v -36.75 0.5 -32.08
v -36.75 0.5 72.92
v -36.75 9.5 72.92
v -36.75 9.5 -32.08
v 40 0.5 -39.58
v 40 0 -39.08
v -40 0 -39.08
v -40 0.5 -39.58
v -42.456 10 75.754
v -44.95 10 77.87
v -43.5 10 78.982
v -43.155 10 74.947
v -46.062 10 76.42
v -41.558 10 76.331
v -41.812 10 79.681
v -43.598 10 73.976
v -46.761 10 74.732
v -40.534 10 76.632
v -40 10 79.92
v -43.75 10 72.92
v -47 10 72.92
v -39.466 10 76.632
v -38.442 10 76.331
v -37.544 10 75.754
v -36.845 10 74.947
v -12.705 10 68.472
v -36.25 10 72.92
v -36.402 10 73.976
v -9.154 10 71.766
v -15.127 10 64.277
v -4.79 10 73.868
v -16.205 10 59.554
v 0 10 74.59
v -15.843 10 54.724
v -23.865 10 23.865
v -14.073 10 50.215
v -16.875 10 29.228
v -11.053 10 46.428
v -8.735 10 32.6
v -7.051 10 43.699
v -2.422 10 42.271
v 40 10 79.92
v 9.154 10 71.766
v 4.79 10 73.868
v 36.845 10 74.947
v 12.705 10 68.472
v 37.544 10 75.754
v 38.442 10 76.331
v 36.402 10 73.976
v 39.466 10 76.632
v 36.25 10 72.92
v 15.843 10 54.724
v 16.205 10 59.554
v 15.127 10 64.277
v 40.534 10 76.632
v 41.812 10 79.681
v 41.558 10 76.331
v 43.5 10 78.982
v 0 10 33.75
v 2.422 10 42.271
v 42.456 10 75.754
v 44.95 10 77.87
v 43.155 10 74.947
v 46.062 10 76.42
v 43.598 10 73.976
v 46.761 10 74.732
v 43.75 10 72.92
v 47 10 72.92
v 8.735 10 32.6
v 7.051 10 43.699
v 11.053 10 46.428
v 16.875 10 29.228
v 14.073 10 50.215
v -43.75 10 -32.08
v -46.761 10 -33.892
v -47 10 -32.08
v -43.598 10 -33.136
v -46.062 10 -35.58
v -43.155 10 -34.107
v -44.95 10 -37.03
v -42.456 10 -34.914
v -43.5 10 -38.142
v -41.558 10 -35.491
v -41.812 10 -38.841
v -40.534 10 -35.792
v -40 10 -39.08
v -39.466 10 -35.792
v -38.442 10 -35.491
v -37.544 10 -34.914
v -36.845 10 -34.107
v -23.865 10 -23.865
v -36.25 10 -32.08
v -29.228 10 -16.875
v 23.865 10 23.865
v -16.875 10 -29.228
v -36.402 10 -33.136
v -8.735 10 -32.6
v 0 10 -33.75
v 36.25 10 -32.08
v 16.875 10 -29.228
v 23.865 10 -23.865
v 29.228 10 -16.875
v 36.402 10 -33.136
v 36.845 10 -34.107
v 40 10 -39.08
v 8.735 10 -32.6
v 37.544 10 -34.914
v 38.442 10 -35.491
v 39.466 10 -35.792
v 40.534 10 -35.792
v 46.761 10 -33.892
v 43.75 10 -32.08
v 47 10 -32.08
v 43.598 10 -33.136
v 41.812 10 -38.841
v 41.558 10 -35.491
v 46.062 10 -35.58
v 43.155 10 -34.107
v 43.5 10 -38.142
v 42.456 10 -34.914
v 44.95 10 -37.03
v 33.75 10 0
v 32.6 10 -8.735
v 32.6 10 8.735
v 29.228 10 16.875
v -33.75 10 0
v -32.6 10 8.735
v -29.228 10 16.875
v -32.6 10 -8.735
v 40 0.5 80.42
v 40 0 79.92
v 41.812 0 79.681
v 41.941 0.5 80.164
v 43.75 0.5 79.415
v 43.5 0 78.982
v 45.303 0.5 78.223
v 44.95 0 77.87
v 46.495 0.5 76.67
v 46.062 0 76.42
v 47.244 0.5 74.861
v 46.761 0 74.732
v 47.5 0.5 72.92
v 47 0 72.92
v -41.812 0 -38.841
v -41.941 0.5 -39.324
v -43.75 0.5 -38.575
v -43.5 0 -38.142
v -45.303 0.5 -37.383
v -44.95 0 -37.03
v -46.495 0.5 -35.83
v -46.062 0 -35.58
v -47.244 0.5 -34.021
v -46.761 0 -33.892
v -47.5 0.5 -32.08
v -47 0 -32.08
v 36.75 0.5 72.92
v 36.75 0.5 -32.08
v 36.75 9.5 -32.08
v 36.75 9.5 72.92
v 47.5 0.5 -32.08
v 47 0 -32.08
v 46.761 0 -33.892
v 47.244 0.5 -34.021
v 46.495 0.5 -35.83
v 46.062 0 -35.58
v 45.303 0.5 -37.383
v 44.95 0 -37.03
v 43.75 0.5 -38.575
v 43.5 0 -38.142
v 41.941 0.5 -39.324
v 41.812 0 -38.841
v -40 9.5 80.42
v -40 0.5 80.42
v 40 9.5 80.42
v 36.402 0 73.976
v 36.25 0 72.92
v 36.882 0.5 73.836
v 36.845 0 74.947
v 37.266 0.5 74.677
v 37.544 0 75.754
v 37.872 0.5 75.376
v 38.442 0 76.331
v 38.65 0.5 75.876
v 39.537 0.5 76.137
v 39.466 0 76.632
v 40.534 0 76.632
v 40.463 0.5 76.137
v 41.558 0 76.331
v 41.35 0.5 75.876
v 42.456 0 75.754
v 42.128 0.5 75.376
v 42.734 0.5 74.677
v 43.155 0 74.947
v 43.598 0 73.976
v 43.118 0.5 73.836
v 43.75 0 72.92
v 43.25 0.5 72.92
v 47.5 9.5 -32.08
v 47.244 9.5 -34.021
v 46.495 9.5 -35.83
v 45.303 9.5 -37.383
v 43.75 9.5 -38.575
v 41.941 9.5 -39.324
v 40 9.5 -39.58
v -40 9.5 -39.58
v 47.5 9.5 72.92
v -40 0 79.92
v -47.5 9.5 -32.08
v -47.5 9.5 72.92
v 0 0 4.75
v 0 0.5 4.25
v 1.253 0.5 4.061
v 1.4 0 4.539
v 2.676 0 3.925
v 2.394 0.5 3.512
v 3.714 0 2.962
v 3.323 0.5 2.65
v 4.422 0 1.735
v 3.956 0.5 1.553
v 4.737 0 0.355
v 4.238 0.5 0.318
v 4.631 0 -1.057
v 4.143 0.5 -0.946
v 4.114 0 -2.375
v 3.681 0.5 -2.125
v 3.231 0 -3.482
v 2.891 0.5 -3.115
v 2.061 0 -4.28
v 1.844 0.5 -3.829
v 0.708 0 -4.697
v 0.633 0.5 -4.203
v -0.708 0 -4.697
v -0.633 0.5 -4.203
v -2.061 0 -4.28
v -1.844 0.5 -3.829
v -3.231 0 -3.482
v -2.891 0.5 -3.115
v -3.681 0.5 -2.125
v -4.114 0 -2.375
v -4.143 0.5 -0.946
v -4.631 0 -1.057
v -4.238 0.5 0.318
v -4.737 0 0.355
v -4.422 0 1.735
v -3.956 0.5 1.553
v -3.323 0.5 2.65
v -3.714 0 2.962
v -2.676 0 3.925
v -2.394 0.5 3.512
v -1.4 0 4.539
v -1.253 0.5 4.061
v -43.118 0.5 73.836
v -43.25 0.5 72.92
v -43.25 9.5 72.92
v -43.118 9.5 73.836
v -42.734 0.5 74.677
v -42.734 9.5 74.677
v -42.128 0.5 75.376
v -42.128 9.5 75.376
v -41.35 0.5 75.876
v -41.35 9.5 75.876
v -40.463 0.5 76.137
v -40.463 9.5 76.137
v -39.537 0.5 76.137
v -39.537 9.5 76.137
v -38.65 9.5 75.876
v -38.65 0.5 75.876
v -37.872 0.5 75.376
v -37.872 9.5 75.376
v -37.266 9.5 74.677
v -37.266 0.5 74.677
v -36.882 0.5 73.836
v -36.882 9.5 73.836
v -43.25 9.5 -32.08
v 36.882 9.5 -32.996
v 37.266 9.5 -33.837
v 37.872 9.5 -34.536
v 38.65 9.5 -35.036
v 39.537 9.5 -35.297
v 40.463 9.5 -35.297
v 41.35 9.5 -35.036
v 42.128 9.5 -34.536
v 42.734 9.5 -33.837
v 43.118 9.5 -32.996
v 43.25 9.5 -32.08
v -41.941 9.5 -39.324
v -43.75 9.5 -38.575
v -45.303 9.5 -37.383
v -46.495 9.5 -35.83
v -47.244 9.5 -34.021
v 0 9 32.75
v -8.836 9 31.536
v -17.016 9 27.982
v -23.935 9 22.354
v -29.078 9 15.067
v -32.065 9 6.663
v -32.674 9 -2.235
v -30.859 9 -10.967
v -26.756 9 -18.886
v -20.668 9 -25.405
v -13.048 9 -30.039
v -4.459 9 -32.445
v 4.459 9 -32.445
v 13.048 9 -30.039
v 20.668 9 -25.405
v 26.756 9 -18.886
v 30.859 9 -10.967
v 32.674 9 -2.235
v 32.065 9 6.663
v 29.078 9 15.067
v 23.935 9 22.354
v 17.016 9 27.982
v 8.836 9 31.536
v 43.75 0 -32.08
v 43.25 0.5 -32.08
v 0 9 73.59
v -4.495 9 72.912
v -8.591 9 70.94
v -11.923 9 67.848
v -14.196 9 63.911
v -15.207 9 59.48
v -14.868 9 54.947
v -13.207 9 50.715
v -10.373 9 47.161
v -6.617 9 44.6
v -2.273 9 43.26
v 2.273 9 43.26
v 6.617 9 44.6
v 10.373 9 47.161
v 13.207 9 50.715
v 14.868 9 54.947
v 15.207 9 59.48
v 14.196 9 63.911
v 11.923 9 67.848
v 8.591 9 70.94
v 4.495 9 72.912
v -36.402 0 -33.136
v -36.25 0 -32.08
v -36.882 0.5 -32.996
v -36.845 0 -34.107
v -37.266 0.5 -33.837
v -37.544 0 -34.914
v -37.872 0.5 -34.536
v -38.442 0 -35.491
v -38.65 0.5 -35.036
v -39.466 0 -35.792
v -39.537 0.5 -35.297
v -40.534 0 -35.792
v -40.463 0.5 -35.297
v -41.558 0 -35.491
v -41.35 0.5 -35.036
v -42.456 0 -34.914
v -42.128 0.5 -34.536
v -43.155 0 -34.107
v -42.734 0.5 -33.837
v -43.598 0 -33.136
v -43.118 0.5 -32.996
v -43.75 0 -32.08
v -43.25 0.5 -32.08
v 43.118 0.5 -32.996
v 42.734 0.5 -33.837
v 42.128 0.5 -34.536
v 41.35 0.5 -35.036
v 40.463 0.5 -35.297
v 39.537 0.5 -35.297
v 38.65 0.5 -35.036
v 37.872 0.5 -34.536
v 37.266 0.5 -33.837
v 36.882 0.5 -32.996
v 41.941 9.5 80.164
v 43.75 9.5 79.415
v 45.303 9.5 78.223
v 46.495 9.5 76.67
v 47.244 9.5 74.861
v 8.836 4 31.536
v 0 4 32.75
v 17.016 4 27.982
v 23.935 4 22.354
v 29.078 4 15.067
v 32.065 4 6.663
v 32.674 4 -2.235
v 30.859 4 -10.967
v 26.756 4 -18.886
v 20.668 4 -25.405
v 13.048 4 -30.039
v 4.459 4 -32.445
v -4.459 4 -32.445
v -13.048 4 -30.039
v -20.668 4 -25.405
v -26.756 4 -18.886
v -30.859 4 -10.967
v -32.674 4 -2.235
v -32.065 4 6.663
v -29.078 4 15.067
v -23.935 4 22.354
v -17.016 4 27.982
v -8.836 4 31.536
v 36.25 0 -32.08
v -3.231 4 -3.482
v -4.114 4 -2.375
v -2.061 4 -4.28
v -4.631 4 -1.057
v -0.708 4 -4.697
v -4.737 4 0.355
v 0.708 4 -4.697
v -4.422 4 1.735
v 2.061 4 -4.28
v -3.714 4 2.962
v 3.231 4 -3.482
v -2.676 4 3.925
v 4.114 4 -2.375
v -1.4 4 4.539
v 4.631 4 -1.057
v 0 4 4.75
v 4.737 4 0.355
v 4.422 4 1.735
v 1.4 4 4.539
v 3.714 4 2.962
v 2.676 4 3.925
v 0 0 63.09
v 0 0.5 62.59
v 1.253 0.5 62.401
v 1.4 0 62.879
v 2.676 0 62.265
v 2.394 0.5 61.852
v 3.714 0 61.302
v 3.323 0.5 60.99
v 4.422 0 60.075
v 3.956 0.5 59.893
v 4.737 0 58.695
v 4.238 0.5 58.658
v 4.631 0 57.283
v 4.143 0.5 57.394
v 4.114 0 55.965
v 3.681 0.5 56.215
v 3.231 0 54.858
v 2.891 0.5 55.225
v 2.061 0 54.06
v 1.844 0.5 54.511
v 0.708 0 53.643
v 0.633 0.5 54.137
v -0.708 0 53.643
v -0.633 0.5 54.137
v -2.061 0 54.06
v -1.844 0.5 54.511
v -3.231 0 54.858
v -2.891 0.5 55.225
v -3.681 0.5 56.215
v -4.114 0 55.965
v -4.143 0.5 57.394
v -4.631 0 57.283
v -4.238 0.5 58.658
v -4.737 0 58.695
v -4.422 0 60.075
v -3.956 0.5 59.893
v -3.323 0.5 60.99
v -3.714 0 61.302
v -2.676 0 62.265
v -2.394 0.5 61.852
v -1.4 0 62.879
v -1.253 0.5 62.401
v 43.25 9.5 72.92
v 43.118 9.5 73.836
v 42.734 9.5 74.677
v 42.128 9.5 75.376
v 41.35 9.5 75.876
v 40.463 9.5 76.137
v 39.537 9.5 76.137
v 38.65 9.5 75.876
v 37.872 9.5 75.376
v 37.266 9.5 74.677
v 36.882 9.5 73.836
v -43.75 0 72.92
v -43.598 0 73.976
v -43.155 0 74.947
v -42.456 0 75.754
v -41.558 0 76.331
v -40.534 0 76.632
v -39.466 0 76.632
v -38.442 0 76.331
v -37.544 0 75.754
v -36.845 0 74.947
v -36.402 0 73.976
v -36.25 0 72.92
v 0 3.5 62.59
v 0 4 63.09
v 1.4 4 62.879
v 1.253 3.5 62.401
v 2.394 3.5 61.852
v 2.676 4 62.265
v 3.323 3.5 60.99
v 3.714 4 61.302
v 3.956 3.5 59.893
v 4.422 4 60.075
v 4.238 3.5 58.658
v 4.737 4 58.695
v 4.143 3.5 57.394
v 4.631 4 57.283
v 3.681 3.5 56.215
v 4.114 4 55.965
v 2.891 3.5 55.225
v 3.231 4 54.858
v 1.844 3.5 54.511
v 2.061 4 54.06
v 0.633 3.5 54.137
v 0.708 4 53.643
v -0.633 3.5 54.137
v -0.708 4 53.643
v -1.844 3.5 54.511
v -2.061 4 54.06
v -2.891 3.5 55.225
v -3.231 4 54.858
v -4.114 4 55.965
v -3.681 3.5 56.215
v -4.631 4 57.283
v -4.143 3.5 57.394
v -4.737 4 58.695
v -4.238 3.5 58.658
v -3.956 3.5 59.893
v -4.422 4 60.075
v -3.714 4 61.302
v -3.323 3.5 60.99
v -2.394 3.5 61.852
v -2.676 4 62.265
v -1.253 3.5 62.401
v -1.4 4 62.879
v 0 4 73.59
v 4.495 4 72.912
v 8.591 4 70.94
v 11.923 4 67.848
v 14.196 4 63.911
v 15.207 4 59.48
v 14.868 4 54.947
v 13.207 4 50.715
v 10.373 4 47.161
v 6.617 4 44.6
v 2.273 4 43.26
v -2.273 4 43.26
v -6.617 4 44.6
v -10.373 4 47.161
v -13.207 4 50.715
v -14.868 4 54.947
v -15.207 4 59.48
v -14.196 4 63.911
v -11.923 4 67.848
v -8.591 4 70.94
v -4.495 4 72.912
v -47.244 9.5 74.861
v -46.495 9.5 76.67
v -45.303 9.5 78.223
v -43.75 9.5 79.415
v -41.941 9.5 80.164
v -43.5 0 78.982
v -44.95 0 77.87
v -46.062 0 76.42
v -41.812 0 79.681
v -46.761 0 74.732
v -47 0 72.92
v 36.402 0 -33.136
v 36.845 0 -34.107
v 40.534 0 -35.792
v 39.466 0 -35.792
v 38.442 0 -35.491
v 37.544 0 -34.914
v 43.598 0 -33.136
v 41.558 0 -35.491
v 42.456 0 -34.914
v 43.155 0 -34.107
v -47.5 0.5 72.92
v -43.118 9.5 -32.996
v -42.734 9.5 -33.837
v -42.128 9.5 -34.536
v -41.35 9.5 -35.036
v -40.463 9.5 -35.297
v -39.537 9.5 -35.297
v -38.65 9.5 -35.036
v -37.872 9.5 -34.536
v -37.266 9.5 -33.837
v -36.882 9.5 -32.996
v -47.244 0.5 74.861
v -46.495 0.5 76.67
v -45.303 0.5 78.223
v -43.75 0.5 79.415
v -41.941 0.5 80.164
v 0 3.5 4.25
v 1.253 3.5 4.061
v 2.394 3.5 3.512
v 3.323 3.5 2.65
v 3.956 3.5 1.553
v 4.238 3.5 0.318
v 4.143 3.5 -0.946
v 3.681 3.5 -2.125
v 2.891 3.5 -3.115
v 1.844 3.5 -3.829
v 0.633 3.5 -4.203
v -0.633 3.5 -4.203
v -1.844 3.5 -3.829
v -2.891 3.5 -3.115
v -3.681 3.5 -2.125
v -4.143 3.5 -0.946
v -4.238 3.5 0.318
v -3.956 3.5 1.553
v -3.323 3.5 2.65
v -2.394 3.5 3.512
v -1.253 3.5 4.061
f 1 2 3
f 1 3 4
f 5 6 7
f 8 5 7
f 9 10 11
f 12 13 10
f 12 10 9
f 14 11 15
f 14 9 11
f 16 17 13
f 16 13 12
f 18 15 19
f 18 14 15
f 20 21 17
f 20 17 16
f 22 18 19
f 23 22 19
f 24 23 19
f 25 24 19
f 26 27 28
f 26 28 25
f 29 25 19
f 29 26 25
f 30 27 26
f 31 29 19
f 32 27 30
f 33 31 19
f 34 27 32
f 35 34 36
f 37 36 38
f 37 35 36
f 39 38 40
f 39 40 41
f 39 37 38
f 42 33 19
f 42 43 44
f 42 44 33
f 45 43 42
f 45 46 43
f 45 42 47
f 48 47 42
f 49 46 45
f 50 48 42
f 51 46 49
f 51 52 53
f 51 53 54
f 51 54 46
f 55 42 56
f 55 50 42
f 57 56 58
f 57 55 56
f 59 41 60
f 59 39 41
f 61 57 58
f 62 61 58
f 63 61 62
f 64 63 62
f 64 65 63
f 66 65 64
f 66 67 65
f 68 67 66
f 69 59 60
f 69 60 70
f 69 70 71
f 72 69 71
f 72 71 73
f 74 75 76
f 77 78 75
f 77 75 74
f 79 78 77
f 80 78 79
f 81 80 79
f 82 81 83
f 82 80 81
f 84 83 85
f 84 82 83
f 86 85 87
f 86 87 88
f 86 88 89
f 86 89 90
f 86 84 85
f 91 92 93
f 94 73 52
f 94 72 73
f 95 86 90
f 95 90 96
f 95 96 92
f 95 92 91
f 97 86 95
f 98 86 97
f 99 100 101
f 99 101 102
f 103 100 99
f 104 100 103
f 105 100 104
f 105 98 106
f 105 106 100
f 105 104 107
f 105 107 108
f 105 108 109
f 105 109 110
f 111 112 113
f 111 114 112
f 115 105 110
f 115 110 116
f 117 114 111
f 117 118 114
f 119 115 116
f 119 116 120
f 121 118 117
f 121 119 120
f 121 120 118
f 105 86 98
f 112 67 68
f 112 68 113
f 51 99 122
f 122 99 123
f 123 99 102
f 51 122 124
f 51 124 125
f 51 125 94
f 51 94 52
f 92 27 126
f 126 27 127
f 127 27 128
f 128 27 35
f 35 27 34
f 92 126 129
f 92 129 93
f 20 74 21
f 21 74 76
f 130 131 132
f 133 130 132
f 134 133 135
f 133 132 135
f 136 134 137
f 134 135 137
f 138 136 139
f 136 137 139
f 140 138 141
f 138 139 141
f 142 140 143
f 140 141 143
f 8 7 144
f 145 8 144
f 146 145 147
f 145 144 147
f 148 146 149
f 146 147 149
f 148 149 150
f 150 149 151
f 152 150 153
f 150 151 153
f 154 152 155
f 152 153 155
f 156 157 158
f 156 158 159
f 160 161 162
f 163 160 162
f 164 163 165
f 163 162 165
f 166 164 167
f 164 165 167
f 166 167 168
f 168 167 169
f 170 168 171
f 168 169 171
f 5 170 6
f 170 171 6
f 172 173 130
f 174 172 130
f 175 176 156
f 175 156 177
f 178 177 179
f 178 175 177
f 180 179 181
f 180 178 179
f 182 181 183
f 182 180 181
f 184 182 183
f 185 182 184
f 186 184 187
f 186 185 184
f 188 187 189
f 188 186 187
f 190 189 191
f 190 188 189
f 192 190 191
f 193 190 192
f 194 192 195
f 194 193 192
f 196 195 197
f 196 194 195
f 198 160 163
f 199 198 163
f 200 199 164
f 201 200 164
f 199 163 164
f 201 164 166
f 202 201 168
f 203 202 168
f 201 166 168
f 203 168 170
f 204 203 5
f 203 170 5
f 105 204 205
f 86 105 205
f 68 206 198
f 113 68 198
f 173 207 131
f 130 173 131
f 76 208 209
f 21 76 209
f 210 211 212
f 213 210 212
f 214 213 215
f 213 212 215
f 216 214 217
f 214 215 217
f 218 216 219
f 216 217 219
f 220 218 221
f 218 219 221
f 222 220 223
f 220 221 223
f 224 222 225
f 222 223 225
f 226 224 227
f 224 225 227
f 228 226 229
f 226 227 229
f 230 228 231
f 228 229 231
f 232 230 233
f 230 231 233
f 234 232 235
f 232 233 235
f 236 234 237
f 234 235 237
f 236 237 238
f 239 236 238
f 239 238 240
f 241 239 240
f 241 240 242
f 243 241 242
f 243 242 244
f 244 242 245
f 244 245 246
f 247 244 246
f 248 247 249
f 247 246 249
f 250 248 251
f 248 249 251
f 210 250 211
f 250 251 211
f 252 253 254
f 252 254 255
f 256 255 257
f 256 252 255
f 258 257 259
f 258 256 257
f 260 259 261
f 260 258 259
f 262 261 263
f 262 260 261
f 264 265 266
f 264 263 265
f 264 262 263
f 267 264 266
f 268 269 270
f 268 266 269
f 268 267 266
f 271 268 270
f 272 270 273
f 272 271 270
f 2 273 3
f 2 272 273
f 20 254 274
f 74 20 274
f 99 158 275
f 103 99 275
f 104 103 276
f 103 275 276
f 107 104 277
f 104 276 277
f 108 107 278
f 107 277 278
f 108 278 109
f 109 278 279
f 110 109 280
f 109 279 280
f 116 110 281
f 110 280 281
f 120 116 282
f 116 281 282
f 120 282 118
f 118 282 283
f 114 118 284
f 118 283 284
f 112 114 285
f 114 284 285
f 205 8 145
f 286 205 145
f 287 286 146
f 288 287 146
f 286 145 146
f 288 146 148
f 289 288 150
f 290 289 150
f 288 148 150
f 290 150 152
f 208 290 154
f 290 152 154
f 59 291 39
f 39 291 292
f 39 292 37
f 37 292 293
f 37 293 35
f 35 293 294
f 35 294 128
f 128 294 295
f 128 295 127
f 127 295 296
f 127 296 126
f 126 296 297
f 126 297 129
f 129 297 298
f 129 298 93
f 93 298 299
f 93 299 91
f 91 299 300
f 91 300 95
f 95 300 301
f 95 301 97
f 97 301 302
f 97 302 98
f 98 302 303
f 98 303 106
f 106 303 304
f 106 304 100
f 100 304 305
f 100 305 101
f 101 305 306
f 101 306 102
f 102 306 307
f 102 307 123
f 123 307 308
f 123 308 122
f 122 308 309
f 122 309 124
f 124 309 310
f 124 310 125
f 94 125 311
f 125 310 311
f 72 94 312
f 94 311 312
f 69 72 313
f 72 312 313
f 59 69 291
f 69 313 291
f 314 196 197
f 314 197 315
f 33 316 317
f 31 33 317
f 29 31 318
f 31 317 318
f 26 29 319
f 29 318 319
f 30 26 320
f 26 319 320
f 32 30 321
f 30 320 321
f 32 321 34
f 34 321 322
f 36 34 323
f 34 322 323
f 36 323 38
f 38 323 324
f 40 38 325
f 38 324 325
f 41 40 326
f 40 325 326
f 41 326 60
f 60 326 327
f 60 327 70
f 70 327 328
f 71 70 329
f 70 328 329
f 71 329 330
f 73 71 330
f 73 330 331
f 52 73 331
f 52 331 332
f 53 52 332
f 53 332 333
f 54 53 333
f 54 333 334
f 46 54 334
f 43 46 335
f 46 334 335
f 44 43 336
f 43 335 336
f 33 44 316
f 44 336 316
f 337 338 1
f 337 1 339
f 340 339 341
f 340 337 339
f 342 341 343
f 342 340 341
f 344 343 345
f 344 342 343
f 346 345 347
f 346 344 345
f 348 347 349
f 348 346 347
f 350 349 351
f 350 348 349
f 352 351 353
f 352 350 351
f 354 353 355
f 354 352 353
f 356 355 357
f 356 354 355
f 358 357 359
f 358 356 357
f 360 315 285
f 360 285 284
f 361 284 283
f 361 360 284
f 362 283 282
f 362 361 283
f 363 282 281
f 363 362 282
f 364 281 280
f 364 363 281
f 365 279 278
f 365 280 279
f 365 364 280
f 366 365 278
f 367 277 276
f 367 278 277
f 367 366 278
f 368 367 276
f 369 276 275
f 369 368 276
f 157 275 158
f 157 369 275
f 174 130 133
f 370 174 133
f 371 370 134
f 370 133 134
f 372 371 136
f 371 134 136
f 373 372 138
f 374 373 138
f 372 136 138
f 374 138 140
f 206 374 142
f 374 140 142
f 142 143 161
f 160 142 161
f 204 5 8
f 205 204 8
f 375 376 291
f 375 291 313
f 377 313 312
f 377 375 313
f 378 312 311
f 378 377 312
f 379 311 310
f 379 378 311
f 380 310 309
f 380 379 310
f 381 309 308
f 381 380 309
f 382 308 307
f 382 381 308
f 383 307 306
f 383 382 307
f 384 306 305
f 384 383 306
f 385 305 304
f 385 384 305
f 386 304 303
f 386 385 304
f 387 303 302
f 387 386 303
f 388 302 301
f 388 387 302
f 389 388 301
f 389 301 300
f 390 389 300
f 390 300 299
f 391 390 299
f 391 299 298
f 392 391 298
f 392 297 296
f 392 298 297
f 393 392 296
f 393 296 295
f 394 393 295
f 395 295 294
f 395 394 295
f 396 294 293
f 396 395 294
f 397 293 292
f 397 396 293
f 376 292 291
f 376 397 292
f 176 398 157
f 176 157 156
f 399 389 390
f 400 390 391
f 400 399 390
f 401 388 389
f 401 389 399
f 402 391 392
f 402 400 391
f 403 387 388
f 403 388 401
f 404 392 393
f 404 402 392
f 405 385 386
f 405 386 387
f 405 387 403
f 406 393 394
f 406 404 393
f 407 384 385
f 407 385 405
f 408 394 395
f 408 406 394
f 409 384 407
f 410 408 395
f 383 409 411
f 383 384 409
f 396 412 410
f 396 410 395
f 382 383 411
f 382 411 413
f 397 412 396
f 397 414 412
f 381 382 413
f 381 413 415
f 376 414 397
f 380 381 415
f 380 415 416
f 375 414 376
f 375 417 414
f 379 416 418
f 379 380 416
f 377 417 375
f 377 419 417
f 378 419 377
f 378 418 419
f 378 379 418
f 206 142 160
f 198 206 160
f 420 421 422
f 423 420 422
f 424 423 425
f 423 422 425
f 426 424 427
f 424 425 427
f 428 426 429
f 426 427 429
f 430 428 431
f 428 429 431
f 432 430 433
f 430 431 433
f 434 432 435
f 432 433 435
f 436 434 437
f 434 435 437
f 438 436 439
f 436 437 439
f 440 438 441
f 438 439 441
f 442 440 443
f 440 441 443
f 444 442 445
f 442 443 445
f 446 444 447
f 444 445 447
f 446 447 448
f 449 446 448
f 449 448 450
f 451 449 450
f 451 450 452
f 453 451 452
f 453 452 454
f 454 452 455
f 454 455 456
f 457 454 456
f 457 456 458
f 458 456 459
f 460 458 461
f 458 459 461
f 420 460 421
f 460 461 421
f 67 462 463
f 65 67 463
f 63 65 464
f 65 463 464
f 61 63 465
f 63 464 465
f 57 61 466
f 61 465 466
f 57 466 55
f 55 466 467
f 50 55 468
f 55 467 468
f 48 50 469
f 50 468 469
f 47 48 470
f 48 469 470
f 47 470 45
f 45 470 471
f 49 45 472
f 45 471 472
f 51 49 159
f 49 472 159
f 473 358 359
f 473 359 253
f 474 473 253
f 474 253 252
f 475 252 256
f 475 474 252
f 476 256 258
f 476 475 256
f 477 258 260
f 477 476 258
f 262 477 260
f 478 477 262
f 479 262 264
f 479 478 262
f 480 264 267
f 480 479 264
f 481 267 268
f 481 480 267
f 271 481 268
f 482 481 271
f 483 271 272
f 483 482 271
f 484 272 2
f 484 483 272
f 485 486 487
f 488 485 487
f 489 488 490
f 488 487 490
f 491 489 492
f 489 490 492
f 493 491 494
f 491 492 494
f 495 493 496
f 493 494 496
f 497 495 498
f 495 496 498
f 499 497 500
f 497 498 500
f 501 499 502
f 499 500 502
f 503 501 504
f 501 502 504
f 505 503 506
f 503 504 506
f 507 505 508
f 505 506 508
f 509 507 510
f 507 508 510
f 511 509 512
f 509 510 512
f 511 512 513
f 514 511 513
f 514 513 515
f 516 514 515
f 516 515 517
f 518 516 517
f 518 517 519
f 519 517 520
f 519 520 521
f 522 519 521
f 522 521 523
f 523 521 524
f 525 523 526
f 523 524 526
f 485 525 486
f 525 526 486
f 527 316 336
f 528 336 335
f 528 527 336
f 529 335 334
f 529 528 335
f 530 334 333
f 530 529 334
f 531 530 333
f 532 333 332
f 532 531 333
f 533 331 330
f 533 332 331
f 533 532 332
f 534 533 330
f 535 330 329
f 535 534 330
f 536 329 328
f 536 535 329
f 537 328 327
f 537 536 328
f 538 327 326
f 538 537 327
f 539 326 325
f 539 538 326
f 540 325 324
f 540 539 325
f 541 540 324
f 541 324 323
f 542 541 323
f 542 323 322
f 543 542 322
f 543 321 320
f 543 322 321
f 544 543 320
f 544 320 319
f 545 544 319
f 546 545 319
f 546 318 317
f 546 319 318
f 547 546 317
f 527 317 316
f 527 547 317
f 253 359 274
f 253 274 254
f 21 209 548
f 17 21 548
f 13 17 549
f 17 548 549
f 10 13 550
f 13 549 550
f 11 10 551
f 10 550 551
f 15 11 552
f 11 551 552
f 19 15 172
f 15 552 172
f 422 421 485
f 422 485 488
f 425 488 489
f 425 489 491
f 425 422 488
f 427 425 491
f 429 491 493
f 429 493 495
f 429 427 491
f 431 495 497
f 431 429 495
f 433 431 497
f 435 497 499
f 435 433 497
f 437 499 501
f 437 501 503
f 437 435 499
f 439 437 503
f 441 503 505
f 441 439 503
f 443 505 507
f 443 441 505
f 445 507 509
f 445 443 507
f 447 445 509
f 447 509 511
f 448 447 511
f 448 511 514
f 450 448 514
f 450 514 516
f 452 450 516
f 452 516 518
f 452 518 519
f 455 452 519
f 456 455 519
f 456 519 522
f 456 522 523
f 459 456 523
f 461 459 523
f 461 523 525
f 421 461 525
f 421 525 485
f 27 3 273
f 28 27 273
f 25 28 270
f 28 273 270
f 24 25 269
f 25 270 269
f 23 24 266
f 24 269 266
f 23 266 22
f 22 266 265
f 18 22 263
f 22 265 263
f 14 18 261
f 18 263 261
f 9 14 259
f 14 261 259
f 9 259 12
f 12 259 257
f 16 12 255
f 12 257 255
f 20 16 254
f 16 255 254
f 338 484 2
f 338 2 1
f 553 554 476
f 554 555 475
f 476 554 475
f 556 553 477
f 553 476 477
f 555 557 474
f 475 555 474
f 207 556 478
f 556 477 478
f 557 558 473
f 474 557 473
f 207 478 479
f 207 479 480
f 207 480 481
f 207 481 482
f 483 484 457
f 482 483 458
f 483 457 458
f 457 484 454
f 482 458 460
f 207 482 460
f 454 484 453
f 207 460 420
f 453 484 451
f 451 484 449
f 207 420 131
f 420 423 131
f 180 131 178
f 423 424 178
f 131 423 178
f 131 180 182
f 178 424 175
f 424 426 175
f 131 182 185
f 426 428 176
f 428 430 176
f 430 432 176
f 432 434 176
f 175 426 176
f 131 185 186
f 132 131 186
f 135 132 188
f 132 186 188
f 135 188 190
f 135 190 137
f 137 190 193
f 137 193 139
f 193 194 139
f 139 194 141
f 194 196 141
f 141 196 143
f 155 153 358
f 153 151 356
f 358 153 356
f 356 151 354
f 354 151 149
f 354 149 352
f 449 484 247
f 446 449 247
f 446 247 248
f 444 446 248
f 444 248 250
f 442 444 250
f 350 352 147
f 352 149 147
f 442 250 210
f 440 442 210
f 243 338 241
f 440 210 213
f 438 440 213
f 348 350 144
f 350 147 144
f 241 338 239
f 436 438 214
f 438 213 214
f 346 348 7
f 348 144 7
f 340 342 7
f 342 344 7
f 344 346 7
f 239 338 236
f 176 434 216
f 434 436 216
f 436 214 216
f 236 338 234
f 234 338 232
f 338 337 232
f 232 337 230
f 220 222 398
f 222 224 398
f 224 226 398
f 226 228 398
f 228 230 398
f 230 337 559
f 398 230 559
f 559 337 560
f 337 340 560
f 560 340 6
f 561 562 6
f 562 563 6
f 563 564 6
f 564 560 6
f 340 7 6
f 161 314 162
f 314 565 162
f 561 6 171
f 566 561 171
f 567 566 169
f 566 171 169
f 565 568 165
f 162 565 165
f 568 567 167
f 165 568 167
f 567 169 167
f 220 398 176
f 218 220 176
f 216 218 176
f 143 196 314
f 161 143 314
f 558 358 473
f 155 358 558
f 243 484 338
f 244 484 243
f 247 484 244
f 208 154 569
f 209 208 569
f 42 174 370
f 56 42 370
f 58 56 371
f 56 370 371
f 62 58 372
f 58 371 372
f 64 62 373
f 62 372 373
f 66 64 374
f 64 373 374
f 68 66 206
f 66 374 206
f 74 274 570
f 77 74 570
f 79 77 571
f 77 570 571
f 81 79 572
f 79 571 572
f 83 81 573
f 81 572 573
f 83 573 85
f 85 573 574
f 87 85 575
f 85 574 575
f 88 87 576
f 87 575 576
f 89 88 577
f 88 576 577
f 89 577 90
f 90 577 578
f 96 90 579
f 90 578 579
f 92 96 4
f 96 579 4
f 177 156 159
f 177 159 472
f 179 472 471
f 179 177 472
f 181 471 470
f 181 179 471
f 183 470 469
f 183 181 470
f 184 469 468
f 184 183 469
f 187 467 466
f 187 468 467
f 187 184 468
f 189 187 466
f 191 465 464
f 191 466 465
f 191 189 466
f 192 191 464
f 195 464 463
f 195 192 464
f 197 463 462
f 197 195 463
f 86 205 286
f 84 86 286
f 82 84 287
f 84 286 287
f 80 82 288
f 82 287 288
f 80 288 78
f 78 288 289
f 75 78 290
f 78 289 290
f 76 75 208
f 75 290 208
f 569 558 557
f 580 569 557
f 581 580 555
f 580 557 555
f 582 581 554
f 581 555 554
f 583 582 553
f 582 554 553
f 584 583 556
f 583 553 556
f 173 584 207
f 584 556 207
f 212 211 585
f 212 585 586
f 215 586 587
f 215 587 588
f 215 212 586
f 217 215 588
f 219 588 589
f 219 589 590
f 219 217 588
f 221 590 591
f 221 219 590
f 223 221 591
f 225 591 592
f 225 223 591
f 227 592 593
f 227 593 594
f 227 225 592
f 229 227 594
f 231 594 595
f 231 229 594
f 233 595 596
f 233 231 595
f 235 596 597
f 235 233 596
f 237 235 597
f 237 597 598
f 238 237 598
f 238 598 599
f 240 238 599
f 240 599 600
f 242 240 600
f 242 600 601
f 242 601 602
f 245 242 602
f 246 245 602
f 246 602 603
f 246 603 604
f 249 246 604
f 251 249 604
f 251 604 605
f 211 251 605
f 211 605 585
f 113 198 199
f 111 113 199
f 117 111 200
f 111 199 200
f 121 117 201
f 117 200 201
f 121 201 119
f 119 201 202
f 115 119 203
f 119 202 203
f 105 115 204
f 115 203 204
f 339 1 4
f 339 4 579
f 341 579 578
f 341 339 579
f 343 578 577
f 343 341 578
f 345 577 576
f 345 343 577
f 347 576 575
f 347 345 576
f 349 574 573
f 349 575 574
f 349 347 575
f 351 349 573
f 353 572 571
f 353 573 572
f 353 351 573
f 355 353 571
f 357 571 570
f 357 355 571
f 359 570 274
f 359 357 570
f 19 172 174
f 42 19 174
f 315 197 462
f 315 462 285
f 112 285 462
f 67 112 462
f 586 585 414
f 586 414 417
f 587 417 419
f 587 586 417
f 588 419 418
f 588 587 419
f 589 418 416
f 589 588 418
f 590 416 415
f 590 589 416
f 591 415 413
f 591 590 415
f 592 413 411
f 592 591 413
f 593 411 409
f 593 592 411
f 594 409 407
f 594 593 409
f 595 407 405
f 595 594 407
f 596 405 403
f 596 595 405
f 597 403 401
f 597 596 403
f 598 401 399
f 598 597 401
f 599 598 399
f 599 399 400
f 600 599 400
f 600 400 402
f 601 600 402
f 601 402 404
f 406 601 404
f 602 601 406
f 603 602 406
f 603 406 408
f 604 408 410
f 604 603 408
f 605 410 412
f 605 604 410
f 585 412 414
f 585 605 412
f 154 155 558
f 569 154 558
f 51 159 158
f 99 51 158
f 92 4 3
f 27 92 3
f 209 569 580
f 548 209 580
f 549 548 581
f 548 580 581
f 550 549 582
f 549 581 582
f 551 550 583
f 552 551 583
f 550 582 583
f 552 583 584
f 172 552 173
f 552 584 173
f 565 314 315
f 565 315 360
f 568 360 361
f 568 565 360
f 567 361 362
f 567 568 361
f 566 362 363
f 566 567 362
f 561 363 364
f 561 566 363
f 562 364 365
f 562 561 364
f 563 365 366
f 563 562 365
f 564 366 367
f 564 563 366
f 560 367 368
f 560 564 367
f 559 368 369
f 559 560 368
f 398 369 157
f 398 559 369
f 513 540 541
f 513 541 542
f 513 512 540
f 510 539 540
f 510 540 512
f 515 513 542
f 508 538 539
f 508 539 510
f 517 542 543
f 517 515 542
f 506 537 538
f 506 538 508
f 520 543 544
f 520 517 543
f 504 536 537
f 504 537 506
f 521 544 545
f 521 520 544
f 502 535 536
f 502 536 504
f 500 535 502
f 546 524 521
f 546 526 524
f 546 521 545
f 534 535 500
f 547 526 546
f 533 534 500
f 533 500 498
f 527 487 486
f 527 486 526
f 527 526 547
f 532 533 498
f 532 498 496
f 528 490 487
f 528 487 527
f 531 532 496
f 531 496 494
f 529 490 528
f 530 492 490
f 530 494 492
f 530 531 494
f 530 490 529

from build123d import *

# Parameters (mm, degrees)
SKETCH1_R           = 32.75
SKETCH1_R_2         = 15.25
SKETCH1_R_3         = 4.25
BOSS_EXTRUDE1_DEPTH = 10
SKETCH1_4_R         = 4.25
CUT_EXTRUDE2_DEPTH  = 94.934159921
CUT_EXTRUDE3_START  = 4
SKETCH1_6_R         = 32.75
SKETCH1_6_R_2       = 4.25
SKETCH1_6_R_3       = 15.25
CUT_EXTRUDE3_DEPTH  = 90.934159921
CHAMFER1_SIZE       = 1
CHAMFER2_SIZE       = 0.5


with BuildPart() as part:
    # Sketch1 → Boss-Extrude1 (new body)
    # profile 1 of 9: a face of its own
    with BuildSketch(Plane(origin=(0, 0, 0), x_dir=(1, 0, 0), z_dir=(0, 1, 0))):
        with BuildLine():
            Line((-40, -80.42), (40, -80.42))
            ThreePointArc((40, -80.42), (45.303300859, -78.223300859), (47.5, -72.92))
            Line((47.5, -72.92), (47.5, 32.08))
            ThreePointArc((47.5, 32.08), (45.303300859, 37.383300859), (40, 39.58))
            Line((40, 39.58), (-40, 39.58))
            ThreePointArc((-40, 39.58), (-45.303300859, 37.383300859), (-47.5, 32.08))
            Line((-47.5, 32.08), (-47.5, -72.92))
            ThreePointArc((-47.5, -72.92), (-45.303300859, -78.223300859), (-40, -80.42))
        make_face()
        Circle(SKETCH1_R, mode=Mode.SUBTRACT)
        with Locations((0, -58.34)):
            Circle(SKETCH1_R_2, mode=Mode.SUBTRACT)
        with BuildLine():
            ThreePointArc((46, 32.08), (40, 38.08), (34, 32.08))
            Line((34, 32.08), (34, -72.92))
            ThreePointArc((34, -72.92), (40, -78.92), (46, -72.92))
            Line((46, -72.92), (46, 32.08))
        make_face(mode=Mode.SUBTRACT)
        with BuildLine():
            ThreePointArc((-34, 32.08), (-40, 38.08), (-46, 32.08))
            Line((-46, 32.08), (-46, -72.92))
            ThreePointArc((-46, -72.92), (-40, -78.92), (-34, -72.92))
            Line((-34, -72.92), (-34, 32.08))
        make_face(mode=Mode.SUBTRACT)
    # profile 2 of 9: a face of its own
    with BuildSketch(Plane(origin=(0, 0, 0), x_dir=(1, 0, 0), z_dir=(0, 1, 0))):
        Circle(SKETCH1_R)
        Circle(SKETCH1_R_3, mode=Mode.SUBTRACT)
    # profile 3 of 9: a face of its own
    with BuildSketch(Plane(origin=(0, 0, 0), x_dir=(1, 0, 0), z_dir=(0, 1, 0))):
        with Locations((0, -58.34)):
            Circle(SKETCH1_R_2)
        with Locations((0, -58.34)):
            Circle(SKETCH1_R_3, mode=Mode.SUBTRACT)
    # profile 4 of 9: a face of its own
    with BuildSketch(Plane(origin=(0, 0, 0), x_dir=(1, 0, 0), z_dir=(0, 1, 0))):
        with BuildLine():
            Line((-34, -72.92), (-34, 32.08))
            ThreePointArc((-34, 32.08), (-40, 38.08), (-46, 32.08))
            Line((-46, 32.08), (-46, -72.92))
            ThreePointArc((-46, -72.92), (-40, -78.92), (-34, -72.92))
        make_face()
        with BuildLine():
            ThreePointArc((-43.25, -72.92), (-40, -76.17), (-36.75, -72.92))
            Line((-36.75, -72.92), (-36.75, 32.08))
            ThreePointArc((-36.75, 32.08), (-40, 35.33), (-43.25, 32.08))
            Line((-43.25, 32.08), (-43.25, -72.92))
        make_face(mode=Mode.SUBTRACT)
    # profile 5 of 9: a face of its own
    with BuildSketch(Plane(origin=(0, 0, 0), x_dir=(1, 0, 0), z_dir=(0, 1, 0))):
        with BuildLine():
            Line((46, -72.92), (46, 32.08))
            ThreePointArc((46, 32.08), (40, 38.08), (34, 32.08))
            Line((34, 32.08), (34, -72.92))
            ThreePointArc((34, -72.92), (40, -78.92), (46, -72.92))
        make_face()
        with BuildLine():
            ThreePointArc((36.75, -72.92), (40, -76.17), (43.25, -72.92))
            Line((43.25, -72.92), (43.25, 32.08))
            ThreePointArc((43.25, 32.08), (40, 35.33), (36.75, 32.08))
            Line((36.75, 32.08), (36.75, -72.92))
        make_face(mode=Mode.SUBTRACT)
    # profile 6 of 9: a face of its own
    with BuildSketch(Plane(origin=(0, 0, 0), x_dir=(1, 0, 0), z_dir=(0, 1, 0))):
        with BuildLine():
            Line((36.75, 32.08), (36.75, -72.92))
            ThreePointArc((36.75, -72.92), (40, -76.17), (43.25, -72.92))
            Line((43.25, -72.92), (43.25, 32.08))
            ThreePointArc((43.25, 32.08), (40, 35.33), (36.75, 32.08))
        make_face()
    # profile 7 of 9: a face of its own
    with BuildSketch(Plane(origin=(0, 0, 0), x_dir=(1, 0, 0), z_dir=(0, 1, 0))):
        with BuildLine():
            Line((-43.25, 32.08), (-43.25, -72.92))
            ThreePointArc((-43.25, -72.92), (-40, -76.17), (-36.75, -72.92))
            Line((-36.75, -72.92), (-36.75, 32.08))
            ThreePointArc((-36.75, 32.08), (-40, 35.33), (-43.25, 32.08))
        make_face()
    # profile 8 of 9: a face of its own
    with BuildSketch(Plane(origin=(0, 0, 0), x_dir=(1, 0, 0), z_dir=(0, 1, 0))):
        Circle(SKETCH1_R_3)
    # profile 9 of 9: a face of its own
    with BuildSketch(Plane(origin=(0, 0, 0), x_dir=(1, 0, 0), z_dir=(0, 1, 0))):
        with Locations((0, -58.34)):
            Circle(SKETCH1_R_3)
    extrude(amount=BOSS_EXTRUDE1_DEPTH)

    # Sketch1<4> → Cut-Extrude2 (cut, through all)
    with BuildSketch(Plane(origin=(0, 0, 0), x_dir=(1, 0, 0), z_dir=(0, 1, 0))):
        with BuildLine():
            Line((36.75, 32.08), (36.75, -72.92))
            ThreePointArc((36.75, -72.92), (40, -76.17), (43.25, -72.92))
            Line((43.25, -72.92), (43.25, 32.08))
            ThreePointArc((43.25, 32.08), (40, 35.33), (36.75, 32.08))
        make_face()
        with Locations(Location((0, 0, 0), (0, 0, 270))):
            Circle(SKETCH1_4_R)
        with Locations(Location((0, -58.34, 0), (0, 0, 270))):
            Circle(SKETCH1_4_R)
        with BuildLine():
            Line((-43.25, 32.08), (-43.25, -72.92))
            ThreePointArc((-43.25, -72.92), (-40, -76.17), (-36.75, -72.92))
            Line((-36.75, -72.92), (-36.75, 32.08))
            ThreePointArc((-36.75, 32.08), (-40, 35.33), (-43.25, 32.08))
        make_face()
    extrude(amount=CUT_EXTRUDE2_DEPTH, mode=Mode.SUBTRACT)

    # Sketch1<6> → Cut-Extrude3 (cut, through all)
    # profile 1 of 2: a face of its own
    with BuildSketch(Plane(origin=(0, 0, 0), x_dir=(1, 0, 0), z_dir=(0, 1, 0)).offset(CUT_EXTRUDE3_START)):
        with Locations(Location((0, 0, 0), (0, 0, 270))):
            Circle(SKETCH1_6_R)
        with Locations(Location((0, 0, 0), (0, 0, 270))):
            Circle(SKETCH1_6_R_2, mode=Mode.SUBTRACT)
    # profile 2 of 2: a face of its own
    with BuildSketch(Plane(origin=(0, 0, 0), x_dir=(1, 0, 0), z_dir=(0, 1, 0)).offset(CUT_EXTRUDE3_START)):
        with Locations(Location((0, -58.34, 0), (0, 0, 270))):
            Circle(SKETCH1_6_R_3)
        with Locations(Location((0, -58.34, 0), (0, 0, 270))):
            Circle(SKETCH1_6_R_2, mode=Mode.SUBTRACT)
    extrude(amount=CUT_EXTRUDE3_DEPTH, mode=Mode.SUBTRACT)

    # Chamfer1
    chamfer1_edges = [part.edges().sort_by_distance(p)[0] for p in [
        (0, 10, -32.75),
        (0, 10, 43.09),
    ]]
    chamfer(chamfer1_edges, length=CHAMFER1_SIZE)

    # Chamfer2
    chamfer2_edges = [part.edges().sort_by_distance(p)[0] for p in [
        (45.303300859, 10, 78.223300859),
        (-47.5, 0, 20.42),
        (-45.303300859, 0, -37.383300859),
        (0, 0, -39.58),
        (45.303300859, 0, -37.383300859),
        (47.5, 0, 20.42),
        (45.303300859, 0, 78.223300859),
        (0, 0, 80.42),
        (47.5, 10, 20.42),
        (45.303300859, 10, -37.383300859),
        (0, 10, -39.58),
        (-45.303300859, 10, -37.383300859),
        (-47.5, 10, 20.42),
        (36.75, 0, 20.42),
        (40, 0, 76.17),
        (43.25, 10, 20.42),
        (40, 0, -35.33),
        (36.75, 10, 20.42),
        (-45.303300859, 10, 78.223300859),
        (40, 10, 76.17),
        (40, 10, -35.33),
        (43.25, 0, 20.42),
        (0, 0, -4.25),
        (0, 0, 54.09),
        (-43.25, 0, 20.42),
        (-40, 0, 76.17),
        (-36.75, 10, 20.42),
        (-40, 0, -35.33),
        (-43.25, 10, 20.42),
        (-40, 10, 76.17),
        (-40, 10, -35.33),
        (0, 10, 80.42),
        (-36.75, 0, 20.42),
        (0, 4, -4.25),
        (0, 4, 54.09),
        (-45.303300859, 0, 78.223300859),
    ]]
    chamfer(chamfer2_edges, length=CHAMFER2_SIZE)


solid = part.part
